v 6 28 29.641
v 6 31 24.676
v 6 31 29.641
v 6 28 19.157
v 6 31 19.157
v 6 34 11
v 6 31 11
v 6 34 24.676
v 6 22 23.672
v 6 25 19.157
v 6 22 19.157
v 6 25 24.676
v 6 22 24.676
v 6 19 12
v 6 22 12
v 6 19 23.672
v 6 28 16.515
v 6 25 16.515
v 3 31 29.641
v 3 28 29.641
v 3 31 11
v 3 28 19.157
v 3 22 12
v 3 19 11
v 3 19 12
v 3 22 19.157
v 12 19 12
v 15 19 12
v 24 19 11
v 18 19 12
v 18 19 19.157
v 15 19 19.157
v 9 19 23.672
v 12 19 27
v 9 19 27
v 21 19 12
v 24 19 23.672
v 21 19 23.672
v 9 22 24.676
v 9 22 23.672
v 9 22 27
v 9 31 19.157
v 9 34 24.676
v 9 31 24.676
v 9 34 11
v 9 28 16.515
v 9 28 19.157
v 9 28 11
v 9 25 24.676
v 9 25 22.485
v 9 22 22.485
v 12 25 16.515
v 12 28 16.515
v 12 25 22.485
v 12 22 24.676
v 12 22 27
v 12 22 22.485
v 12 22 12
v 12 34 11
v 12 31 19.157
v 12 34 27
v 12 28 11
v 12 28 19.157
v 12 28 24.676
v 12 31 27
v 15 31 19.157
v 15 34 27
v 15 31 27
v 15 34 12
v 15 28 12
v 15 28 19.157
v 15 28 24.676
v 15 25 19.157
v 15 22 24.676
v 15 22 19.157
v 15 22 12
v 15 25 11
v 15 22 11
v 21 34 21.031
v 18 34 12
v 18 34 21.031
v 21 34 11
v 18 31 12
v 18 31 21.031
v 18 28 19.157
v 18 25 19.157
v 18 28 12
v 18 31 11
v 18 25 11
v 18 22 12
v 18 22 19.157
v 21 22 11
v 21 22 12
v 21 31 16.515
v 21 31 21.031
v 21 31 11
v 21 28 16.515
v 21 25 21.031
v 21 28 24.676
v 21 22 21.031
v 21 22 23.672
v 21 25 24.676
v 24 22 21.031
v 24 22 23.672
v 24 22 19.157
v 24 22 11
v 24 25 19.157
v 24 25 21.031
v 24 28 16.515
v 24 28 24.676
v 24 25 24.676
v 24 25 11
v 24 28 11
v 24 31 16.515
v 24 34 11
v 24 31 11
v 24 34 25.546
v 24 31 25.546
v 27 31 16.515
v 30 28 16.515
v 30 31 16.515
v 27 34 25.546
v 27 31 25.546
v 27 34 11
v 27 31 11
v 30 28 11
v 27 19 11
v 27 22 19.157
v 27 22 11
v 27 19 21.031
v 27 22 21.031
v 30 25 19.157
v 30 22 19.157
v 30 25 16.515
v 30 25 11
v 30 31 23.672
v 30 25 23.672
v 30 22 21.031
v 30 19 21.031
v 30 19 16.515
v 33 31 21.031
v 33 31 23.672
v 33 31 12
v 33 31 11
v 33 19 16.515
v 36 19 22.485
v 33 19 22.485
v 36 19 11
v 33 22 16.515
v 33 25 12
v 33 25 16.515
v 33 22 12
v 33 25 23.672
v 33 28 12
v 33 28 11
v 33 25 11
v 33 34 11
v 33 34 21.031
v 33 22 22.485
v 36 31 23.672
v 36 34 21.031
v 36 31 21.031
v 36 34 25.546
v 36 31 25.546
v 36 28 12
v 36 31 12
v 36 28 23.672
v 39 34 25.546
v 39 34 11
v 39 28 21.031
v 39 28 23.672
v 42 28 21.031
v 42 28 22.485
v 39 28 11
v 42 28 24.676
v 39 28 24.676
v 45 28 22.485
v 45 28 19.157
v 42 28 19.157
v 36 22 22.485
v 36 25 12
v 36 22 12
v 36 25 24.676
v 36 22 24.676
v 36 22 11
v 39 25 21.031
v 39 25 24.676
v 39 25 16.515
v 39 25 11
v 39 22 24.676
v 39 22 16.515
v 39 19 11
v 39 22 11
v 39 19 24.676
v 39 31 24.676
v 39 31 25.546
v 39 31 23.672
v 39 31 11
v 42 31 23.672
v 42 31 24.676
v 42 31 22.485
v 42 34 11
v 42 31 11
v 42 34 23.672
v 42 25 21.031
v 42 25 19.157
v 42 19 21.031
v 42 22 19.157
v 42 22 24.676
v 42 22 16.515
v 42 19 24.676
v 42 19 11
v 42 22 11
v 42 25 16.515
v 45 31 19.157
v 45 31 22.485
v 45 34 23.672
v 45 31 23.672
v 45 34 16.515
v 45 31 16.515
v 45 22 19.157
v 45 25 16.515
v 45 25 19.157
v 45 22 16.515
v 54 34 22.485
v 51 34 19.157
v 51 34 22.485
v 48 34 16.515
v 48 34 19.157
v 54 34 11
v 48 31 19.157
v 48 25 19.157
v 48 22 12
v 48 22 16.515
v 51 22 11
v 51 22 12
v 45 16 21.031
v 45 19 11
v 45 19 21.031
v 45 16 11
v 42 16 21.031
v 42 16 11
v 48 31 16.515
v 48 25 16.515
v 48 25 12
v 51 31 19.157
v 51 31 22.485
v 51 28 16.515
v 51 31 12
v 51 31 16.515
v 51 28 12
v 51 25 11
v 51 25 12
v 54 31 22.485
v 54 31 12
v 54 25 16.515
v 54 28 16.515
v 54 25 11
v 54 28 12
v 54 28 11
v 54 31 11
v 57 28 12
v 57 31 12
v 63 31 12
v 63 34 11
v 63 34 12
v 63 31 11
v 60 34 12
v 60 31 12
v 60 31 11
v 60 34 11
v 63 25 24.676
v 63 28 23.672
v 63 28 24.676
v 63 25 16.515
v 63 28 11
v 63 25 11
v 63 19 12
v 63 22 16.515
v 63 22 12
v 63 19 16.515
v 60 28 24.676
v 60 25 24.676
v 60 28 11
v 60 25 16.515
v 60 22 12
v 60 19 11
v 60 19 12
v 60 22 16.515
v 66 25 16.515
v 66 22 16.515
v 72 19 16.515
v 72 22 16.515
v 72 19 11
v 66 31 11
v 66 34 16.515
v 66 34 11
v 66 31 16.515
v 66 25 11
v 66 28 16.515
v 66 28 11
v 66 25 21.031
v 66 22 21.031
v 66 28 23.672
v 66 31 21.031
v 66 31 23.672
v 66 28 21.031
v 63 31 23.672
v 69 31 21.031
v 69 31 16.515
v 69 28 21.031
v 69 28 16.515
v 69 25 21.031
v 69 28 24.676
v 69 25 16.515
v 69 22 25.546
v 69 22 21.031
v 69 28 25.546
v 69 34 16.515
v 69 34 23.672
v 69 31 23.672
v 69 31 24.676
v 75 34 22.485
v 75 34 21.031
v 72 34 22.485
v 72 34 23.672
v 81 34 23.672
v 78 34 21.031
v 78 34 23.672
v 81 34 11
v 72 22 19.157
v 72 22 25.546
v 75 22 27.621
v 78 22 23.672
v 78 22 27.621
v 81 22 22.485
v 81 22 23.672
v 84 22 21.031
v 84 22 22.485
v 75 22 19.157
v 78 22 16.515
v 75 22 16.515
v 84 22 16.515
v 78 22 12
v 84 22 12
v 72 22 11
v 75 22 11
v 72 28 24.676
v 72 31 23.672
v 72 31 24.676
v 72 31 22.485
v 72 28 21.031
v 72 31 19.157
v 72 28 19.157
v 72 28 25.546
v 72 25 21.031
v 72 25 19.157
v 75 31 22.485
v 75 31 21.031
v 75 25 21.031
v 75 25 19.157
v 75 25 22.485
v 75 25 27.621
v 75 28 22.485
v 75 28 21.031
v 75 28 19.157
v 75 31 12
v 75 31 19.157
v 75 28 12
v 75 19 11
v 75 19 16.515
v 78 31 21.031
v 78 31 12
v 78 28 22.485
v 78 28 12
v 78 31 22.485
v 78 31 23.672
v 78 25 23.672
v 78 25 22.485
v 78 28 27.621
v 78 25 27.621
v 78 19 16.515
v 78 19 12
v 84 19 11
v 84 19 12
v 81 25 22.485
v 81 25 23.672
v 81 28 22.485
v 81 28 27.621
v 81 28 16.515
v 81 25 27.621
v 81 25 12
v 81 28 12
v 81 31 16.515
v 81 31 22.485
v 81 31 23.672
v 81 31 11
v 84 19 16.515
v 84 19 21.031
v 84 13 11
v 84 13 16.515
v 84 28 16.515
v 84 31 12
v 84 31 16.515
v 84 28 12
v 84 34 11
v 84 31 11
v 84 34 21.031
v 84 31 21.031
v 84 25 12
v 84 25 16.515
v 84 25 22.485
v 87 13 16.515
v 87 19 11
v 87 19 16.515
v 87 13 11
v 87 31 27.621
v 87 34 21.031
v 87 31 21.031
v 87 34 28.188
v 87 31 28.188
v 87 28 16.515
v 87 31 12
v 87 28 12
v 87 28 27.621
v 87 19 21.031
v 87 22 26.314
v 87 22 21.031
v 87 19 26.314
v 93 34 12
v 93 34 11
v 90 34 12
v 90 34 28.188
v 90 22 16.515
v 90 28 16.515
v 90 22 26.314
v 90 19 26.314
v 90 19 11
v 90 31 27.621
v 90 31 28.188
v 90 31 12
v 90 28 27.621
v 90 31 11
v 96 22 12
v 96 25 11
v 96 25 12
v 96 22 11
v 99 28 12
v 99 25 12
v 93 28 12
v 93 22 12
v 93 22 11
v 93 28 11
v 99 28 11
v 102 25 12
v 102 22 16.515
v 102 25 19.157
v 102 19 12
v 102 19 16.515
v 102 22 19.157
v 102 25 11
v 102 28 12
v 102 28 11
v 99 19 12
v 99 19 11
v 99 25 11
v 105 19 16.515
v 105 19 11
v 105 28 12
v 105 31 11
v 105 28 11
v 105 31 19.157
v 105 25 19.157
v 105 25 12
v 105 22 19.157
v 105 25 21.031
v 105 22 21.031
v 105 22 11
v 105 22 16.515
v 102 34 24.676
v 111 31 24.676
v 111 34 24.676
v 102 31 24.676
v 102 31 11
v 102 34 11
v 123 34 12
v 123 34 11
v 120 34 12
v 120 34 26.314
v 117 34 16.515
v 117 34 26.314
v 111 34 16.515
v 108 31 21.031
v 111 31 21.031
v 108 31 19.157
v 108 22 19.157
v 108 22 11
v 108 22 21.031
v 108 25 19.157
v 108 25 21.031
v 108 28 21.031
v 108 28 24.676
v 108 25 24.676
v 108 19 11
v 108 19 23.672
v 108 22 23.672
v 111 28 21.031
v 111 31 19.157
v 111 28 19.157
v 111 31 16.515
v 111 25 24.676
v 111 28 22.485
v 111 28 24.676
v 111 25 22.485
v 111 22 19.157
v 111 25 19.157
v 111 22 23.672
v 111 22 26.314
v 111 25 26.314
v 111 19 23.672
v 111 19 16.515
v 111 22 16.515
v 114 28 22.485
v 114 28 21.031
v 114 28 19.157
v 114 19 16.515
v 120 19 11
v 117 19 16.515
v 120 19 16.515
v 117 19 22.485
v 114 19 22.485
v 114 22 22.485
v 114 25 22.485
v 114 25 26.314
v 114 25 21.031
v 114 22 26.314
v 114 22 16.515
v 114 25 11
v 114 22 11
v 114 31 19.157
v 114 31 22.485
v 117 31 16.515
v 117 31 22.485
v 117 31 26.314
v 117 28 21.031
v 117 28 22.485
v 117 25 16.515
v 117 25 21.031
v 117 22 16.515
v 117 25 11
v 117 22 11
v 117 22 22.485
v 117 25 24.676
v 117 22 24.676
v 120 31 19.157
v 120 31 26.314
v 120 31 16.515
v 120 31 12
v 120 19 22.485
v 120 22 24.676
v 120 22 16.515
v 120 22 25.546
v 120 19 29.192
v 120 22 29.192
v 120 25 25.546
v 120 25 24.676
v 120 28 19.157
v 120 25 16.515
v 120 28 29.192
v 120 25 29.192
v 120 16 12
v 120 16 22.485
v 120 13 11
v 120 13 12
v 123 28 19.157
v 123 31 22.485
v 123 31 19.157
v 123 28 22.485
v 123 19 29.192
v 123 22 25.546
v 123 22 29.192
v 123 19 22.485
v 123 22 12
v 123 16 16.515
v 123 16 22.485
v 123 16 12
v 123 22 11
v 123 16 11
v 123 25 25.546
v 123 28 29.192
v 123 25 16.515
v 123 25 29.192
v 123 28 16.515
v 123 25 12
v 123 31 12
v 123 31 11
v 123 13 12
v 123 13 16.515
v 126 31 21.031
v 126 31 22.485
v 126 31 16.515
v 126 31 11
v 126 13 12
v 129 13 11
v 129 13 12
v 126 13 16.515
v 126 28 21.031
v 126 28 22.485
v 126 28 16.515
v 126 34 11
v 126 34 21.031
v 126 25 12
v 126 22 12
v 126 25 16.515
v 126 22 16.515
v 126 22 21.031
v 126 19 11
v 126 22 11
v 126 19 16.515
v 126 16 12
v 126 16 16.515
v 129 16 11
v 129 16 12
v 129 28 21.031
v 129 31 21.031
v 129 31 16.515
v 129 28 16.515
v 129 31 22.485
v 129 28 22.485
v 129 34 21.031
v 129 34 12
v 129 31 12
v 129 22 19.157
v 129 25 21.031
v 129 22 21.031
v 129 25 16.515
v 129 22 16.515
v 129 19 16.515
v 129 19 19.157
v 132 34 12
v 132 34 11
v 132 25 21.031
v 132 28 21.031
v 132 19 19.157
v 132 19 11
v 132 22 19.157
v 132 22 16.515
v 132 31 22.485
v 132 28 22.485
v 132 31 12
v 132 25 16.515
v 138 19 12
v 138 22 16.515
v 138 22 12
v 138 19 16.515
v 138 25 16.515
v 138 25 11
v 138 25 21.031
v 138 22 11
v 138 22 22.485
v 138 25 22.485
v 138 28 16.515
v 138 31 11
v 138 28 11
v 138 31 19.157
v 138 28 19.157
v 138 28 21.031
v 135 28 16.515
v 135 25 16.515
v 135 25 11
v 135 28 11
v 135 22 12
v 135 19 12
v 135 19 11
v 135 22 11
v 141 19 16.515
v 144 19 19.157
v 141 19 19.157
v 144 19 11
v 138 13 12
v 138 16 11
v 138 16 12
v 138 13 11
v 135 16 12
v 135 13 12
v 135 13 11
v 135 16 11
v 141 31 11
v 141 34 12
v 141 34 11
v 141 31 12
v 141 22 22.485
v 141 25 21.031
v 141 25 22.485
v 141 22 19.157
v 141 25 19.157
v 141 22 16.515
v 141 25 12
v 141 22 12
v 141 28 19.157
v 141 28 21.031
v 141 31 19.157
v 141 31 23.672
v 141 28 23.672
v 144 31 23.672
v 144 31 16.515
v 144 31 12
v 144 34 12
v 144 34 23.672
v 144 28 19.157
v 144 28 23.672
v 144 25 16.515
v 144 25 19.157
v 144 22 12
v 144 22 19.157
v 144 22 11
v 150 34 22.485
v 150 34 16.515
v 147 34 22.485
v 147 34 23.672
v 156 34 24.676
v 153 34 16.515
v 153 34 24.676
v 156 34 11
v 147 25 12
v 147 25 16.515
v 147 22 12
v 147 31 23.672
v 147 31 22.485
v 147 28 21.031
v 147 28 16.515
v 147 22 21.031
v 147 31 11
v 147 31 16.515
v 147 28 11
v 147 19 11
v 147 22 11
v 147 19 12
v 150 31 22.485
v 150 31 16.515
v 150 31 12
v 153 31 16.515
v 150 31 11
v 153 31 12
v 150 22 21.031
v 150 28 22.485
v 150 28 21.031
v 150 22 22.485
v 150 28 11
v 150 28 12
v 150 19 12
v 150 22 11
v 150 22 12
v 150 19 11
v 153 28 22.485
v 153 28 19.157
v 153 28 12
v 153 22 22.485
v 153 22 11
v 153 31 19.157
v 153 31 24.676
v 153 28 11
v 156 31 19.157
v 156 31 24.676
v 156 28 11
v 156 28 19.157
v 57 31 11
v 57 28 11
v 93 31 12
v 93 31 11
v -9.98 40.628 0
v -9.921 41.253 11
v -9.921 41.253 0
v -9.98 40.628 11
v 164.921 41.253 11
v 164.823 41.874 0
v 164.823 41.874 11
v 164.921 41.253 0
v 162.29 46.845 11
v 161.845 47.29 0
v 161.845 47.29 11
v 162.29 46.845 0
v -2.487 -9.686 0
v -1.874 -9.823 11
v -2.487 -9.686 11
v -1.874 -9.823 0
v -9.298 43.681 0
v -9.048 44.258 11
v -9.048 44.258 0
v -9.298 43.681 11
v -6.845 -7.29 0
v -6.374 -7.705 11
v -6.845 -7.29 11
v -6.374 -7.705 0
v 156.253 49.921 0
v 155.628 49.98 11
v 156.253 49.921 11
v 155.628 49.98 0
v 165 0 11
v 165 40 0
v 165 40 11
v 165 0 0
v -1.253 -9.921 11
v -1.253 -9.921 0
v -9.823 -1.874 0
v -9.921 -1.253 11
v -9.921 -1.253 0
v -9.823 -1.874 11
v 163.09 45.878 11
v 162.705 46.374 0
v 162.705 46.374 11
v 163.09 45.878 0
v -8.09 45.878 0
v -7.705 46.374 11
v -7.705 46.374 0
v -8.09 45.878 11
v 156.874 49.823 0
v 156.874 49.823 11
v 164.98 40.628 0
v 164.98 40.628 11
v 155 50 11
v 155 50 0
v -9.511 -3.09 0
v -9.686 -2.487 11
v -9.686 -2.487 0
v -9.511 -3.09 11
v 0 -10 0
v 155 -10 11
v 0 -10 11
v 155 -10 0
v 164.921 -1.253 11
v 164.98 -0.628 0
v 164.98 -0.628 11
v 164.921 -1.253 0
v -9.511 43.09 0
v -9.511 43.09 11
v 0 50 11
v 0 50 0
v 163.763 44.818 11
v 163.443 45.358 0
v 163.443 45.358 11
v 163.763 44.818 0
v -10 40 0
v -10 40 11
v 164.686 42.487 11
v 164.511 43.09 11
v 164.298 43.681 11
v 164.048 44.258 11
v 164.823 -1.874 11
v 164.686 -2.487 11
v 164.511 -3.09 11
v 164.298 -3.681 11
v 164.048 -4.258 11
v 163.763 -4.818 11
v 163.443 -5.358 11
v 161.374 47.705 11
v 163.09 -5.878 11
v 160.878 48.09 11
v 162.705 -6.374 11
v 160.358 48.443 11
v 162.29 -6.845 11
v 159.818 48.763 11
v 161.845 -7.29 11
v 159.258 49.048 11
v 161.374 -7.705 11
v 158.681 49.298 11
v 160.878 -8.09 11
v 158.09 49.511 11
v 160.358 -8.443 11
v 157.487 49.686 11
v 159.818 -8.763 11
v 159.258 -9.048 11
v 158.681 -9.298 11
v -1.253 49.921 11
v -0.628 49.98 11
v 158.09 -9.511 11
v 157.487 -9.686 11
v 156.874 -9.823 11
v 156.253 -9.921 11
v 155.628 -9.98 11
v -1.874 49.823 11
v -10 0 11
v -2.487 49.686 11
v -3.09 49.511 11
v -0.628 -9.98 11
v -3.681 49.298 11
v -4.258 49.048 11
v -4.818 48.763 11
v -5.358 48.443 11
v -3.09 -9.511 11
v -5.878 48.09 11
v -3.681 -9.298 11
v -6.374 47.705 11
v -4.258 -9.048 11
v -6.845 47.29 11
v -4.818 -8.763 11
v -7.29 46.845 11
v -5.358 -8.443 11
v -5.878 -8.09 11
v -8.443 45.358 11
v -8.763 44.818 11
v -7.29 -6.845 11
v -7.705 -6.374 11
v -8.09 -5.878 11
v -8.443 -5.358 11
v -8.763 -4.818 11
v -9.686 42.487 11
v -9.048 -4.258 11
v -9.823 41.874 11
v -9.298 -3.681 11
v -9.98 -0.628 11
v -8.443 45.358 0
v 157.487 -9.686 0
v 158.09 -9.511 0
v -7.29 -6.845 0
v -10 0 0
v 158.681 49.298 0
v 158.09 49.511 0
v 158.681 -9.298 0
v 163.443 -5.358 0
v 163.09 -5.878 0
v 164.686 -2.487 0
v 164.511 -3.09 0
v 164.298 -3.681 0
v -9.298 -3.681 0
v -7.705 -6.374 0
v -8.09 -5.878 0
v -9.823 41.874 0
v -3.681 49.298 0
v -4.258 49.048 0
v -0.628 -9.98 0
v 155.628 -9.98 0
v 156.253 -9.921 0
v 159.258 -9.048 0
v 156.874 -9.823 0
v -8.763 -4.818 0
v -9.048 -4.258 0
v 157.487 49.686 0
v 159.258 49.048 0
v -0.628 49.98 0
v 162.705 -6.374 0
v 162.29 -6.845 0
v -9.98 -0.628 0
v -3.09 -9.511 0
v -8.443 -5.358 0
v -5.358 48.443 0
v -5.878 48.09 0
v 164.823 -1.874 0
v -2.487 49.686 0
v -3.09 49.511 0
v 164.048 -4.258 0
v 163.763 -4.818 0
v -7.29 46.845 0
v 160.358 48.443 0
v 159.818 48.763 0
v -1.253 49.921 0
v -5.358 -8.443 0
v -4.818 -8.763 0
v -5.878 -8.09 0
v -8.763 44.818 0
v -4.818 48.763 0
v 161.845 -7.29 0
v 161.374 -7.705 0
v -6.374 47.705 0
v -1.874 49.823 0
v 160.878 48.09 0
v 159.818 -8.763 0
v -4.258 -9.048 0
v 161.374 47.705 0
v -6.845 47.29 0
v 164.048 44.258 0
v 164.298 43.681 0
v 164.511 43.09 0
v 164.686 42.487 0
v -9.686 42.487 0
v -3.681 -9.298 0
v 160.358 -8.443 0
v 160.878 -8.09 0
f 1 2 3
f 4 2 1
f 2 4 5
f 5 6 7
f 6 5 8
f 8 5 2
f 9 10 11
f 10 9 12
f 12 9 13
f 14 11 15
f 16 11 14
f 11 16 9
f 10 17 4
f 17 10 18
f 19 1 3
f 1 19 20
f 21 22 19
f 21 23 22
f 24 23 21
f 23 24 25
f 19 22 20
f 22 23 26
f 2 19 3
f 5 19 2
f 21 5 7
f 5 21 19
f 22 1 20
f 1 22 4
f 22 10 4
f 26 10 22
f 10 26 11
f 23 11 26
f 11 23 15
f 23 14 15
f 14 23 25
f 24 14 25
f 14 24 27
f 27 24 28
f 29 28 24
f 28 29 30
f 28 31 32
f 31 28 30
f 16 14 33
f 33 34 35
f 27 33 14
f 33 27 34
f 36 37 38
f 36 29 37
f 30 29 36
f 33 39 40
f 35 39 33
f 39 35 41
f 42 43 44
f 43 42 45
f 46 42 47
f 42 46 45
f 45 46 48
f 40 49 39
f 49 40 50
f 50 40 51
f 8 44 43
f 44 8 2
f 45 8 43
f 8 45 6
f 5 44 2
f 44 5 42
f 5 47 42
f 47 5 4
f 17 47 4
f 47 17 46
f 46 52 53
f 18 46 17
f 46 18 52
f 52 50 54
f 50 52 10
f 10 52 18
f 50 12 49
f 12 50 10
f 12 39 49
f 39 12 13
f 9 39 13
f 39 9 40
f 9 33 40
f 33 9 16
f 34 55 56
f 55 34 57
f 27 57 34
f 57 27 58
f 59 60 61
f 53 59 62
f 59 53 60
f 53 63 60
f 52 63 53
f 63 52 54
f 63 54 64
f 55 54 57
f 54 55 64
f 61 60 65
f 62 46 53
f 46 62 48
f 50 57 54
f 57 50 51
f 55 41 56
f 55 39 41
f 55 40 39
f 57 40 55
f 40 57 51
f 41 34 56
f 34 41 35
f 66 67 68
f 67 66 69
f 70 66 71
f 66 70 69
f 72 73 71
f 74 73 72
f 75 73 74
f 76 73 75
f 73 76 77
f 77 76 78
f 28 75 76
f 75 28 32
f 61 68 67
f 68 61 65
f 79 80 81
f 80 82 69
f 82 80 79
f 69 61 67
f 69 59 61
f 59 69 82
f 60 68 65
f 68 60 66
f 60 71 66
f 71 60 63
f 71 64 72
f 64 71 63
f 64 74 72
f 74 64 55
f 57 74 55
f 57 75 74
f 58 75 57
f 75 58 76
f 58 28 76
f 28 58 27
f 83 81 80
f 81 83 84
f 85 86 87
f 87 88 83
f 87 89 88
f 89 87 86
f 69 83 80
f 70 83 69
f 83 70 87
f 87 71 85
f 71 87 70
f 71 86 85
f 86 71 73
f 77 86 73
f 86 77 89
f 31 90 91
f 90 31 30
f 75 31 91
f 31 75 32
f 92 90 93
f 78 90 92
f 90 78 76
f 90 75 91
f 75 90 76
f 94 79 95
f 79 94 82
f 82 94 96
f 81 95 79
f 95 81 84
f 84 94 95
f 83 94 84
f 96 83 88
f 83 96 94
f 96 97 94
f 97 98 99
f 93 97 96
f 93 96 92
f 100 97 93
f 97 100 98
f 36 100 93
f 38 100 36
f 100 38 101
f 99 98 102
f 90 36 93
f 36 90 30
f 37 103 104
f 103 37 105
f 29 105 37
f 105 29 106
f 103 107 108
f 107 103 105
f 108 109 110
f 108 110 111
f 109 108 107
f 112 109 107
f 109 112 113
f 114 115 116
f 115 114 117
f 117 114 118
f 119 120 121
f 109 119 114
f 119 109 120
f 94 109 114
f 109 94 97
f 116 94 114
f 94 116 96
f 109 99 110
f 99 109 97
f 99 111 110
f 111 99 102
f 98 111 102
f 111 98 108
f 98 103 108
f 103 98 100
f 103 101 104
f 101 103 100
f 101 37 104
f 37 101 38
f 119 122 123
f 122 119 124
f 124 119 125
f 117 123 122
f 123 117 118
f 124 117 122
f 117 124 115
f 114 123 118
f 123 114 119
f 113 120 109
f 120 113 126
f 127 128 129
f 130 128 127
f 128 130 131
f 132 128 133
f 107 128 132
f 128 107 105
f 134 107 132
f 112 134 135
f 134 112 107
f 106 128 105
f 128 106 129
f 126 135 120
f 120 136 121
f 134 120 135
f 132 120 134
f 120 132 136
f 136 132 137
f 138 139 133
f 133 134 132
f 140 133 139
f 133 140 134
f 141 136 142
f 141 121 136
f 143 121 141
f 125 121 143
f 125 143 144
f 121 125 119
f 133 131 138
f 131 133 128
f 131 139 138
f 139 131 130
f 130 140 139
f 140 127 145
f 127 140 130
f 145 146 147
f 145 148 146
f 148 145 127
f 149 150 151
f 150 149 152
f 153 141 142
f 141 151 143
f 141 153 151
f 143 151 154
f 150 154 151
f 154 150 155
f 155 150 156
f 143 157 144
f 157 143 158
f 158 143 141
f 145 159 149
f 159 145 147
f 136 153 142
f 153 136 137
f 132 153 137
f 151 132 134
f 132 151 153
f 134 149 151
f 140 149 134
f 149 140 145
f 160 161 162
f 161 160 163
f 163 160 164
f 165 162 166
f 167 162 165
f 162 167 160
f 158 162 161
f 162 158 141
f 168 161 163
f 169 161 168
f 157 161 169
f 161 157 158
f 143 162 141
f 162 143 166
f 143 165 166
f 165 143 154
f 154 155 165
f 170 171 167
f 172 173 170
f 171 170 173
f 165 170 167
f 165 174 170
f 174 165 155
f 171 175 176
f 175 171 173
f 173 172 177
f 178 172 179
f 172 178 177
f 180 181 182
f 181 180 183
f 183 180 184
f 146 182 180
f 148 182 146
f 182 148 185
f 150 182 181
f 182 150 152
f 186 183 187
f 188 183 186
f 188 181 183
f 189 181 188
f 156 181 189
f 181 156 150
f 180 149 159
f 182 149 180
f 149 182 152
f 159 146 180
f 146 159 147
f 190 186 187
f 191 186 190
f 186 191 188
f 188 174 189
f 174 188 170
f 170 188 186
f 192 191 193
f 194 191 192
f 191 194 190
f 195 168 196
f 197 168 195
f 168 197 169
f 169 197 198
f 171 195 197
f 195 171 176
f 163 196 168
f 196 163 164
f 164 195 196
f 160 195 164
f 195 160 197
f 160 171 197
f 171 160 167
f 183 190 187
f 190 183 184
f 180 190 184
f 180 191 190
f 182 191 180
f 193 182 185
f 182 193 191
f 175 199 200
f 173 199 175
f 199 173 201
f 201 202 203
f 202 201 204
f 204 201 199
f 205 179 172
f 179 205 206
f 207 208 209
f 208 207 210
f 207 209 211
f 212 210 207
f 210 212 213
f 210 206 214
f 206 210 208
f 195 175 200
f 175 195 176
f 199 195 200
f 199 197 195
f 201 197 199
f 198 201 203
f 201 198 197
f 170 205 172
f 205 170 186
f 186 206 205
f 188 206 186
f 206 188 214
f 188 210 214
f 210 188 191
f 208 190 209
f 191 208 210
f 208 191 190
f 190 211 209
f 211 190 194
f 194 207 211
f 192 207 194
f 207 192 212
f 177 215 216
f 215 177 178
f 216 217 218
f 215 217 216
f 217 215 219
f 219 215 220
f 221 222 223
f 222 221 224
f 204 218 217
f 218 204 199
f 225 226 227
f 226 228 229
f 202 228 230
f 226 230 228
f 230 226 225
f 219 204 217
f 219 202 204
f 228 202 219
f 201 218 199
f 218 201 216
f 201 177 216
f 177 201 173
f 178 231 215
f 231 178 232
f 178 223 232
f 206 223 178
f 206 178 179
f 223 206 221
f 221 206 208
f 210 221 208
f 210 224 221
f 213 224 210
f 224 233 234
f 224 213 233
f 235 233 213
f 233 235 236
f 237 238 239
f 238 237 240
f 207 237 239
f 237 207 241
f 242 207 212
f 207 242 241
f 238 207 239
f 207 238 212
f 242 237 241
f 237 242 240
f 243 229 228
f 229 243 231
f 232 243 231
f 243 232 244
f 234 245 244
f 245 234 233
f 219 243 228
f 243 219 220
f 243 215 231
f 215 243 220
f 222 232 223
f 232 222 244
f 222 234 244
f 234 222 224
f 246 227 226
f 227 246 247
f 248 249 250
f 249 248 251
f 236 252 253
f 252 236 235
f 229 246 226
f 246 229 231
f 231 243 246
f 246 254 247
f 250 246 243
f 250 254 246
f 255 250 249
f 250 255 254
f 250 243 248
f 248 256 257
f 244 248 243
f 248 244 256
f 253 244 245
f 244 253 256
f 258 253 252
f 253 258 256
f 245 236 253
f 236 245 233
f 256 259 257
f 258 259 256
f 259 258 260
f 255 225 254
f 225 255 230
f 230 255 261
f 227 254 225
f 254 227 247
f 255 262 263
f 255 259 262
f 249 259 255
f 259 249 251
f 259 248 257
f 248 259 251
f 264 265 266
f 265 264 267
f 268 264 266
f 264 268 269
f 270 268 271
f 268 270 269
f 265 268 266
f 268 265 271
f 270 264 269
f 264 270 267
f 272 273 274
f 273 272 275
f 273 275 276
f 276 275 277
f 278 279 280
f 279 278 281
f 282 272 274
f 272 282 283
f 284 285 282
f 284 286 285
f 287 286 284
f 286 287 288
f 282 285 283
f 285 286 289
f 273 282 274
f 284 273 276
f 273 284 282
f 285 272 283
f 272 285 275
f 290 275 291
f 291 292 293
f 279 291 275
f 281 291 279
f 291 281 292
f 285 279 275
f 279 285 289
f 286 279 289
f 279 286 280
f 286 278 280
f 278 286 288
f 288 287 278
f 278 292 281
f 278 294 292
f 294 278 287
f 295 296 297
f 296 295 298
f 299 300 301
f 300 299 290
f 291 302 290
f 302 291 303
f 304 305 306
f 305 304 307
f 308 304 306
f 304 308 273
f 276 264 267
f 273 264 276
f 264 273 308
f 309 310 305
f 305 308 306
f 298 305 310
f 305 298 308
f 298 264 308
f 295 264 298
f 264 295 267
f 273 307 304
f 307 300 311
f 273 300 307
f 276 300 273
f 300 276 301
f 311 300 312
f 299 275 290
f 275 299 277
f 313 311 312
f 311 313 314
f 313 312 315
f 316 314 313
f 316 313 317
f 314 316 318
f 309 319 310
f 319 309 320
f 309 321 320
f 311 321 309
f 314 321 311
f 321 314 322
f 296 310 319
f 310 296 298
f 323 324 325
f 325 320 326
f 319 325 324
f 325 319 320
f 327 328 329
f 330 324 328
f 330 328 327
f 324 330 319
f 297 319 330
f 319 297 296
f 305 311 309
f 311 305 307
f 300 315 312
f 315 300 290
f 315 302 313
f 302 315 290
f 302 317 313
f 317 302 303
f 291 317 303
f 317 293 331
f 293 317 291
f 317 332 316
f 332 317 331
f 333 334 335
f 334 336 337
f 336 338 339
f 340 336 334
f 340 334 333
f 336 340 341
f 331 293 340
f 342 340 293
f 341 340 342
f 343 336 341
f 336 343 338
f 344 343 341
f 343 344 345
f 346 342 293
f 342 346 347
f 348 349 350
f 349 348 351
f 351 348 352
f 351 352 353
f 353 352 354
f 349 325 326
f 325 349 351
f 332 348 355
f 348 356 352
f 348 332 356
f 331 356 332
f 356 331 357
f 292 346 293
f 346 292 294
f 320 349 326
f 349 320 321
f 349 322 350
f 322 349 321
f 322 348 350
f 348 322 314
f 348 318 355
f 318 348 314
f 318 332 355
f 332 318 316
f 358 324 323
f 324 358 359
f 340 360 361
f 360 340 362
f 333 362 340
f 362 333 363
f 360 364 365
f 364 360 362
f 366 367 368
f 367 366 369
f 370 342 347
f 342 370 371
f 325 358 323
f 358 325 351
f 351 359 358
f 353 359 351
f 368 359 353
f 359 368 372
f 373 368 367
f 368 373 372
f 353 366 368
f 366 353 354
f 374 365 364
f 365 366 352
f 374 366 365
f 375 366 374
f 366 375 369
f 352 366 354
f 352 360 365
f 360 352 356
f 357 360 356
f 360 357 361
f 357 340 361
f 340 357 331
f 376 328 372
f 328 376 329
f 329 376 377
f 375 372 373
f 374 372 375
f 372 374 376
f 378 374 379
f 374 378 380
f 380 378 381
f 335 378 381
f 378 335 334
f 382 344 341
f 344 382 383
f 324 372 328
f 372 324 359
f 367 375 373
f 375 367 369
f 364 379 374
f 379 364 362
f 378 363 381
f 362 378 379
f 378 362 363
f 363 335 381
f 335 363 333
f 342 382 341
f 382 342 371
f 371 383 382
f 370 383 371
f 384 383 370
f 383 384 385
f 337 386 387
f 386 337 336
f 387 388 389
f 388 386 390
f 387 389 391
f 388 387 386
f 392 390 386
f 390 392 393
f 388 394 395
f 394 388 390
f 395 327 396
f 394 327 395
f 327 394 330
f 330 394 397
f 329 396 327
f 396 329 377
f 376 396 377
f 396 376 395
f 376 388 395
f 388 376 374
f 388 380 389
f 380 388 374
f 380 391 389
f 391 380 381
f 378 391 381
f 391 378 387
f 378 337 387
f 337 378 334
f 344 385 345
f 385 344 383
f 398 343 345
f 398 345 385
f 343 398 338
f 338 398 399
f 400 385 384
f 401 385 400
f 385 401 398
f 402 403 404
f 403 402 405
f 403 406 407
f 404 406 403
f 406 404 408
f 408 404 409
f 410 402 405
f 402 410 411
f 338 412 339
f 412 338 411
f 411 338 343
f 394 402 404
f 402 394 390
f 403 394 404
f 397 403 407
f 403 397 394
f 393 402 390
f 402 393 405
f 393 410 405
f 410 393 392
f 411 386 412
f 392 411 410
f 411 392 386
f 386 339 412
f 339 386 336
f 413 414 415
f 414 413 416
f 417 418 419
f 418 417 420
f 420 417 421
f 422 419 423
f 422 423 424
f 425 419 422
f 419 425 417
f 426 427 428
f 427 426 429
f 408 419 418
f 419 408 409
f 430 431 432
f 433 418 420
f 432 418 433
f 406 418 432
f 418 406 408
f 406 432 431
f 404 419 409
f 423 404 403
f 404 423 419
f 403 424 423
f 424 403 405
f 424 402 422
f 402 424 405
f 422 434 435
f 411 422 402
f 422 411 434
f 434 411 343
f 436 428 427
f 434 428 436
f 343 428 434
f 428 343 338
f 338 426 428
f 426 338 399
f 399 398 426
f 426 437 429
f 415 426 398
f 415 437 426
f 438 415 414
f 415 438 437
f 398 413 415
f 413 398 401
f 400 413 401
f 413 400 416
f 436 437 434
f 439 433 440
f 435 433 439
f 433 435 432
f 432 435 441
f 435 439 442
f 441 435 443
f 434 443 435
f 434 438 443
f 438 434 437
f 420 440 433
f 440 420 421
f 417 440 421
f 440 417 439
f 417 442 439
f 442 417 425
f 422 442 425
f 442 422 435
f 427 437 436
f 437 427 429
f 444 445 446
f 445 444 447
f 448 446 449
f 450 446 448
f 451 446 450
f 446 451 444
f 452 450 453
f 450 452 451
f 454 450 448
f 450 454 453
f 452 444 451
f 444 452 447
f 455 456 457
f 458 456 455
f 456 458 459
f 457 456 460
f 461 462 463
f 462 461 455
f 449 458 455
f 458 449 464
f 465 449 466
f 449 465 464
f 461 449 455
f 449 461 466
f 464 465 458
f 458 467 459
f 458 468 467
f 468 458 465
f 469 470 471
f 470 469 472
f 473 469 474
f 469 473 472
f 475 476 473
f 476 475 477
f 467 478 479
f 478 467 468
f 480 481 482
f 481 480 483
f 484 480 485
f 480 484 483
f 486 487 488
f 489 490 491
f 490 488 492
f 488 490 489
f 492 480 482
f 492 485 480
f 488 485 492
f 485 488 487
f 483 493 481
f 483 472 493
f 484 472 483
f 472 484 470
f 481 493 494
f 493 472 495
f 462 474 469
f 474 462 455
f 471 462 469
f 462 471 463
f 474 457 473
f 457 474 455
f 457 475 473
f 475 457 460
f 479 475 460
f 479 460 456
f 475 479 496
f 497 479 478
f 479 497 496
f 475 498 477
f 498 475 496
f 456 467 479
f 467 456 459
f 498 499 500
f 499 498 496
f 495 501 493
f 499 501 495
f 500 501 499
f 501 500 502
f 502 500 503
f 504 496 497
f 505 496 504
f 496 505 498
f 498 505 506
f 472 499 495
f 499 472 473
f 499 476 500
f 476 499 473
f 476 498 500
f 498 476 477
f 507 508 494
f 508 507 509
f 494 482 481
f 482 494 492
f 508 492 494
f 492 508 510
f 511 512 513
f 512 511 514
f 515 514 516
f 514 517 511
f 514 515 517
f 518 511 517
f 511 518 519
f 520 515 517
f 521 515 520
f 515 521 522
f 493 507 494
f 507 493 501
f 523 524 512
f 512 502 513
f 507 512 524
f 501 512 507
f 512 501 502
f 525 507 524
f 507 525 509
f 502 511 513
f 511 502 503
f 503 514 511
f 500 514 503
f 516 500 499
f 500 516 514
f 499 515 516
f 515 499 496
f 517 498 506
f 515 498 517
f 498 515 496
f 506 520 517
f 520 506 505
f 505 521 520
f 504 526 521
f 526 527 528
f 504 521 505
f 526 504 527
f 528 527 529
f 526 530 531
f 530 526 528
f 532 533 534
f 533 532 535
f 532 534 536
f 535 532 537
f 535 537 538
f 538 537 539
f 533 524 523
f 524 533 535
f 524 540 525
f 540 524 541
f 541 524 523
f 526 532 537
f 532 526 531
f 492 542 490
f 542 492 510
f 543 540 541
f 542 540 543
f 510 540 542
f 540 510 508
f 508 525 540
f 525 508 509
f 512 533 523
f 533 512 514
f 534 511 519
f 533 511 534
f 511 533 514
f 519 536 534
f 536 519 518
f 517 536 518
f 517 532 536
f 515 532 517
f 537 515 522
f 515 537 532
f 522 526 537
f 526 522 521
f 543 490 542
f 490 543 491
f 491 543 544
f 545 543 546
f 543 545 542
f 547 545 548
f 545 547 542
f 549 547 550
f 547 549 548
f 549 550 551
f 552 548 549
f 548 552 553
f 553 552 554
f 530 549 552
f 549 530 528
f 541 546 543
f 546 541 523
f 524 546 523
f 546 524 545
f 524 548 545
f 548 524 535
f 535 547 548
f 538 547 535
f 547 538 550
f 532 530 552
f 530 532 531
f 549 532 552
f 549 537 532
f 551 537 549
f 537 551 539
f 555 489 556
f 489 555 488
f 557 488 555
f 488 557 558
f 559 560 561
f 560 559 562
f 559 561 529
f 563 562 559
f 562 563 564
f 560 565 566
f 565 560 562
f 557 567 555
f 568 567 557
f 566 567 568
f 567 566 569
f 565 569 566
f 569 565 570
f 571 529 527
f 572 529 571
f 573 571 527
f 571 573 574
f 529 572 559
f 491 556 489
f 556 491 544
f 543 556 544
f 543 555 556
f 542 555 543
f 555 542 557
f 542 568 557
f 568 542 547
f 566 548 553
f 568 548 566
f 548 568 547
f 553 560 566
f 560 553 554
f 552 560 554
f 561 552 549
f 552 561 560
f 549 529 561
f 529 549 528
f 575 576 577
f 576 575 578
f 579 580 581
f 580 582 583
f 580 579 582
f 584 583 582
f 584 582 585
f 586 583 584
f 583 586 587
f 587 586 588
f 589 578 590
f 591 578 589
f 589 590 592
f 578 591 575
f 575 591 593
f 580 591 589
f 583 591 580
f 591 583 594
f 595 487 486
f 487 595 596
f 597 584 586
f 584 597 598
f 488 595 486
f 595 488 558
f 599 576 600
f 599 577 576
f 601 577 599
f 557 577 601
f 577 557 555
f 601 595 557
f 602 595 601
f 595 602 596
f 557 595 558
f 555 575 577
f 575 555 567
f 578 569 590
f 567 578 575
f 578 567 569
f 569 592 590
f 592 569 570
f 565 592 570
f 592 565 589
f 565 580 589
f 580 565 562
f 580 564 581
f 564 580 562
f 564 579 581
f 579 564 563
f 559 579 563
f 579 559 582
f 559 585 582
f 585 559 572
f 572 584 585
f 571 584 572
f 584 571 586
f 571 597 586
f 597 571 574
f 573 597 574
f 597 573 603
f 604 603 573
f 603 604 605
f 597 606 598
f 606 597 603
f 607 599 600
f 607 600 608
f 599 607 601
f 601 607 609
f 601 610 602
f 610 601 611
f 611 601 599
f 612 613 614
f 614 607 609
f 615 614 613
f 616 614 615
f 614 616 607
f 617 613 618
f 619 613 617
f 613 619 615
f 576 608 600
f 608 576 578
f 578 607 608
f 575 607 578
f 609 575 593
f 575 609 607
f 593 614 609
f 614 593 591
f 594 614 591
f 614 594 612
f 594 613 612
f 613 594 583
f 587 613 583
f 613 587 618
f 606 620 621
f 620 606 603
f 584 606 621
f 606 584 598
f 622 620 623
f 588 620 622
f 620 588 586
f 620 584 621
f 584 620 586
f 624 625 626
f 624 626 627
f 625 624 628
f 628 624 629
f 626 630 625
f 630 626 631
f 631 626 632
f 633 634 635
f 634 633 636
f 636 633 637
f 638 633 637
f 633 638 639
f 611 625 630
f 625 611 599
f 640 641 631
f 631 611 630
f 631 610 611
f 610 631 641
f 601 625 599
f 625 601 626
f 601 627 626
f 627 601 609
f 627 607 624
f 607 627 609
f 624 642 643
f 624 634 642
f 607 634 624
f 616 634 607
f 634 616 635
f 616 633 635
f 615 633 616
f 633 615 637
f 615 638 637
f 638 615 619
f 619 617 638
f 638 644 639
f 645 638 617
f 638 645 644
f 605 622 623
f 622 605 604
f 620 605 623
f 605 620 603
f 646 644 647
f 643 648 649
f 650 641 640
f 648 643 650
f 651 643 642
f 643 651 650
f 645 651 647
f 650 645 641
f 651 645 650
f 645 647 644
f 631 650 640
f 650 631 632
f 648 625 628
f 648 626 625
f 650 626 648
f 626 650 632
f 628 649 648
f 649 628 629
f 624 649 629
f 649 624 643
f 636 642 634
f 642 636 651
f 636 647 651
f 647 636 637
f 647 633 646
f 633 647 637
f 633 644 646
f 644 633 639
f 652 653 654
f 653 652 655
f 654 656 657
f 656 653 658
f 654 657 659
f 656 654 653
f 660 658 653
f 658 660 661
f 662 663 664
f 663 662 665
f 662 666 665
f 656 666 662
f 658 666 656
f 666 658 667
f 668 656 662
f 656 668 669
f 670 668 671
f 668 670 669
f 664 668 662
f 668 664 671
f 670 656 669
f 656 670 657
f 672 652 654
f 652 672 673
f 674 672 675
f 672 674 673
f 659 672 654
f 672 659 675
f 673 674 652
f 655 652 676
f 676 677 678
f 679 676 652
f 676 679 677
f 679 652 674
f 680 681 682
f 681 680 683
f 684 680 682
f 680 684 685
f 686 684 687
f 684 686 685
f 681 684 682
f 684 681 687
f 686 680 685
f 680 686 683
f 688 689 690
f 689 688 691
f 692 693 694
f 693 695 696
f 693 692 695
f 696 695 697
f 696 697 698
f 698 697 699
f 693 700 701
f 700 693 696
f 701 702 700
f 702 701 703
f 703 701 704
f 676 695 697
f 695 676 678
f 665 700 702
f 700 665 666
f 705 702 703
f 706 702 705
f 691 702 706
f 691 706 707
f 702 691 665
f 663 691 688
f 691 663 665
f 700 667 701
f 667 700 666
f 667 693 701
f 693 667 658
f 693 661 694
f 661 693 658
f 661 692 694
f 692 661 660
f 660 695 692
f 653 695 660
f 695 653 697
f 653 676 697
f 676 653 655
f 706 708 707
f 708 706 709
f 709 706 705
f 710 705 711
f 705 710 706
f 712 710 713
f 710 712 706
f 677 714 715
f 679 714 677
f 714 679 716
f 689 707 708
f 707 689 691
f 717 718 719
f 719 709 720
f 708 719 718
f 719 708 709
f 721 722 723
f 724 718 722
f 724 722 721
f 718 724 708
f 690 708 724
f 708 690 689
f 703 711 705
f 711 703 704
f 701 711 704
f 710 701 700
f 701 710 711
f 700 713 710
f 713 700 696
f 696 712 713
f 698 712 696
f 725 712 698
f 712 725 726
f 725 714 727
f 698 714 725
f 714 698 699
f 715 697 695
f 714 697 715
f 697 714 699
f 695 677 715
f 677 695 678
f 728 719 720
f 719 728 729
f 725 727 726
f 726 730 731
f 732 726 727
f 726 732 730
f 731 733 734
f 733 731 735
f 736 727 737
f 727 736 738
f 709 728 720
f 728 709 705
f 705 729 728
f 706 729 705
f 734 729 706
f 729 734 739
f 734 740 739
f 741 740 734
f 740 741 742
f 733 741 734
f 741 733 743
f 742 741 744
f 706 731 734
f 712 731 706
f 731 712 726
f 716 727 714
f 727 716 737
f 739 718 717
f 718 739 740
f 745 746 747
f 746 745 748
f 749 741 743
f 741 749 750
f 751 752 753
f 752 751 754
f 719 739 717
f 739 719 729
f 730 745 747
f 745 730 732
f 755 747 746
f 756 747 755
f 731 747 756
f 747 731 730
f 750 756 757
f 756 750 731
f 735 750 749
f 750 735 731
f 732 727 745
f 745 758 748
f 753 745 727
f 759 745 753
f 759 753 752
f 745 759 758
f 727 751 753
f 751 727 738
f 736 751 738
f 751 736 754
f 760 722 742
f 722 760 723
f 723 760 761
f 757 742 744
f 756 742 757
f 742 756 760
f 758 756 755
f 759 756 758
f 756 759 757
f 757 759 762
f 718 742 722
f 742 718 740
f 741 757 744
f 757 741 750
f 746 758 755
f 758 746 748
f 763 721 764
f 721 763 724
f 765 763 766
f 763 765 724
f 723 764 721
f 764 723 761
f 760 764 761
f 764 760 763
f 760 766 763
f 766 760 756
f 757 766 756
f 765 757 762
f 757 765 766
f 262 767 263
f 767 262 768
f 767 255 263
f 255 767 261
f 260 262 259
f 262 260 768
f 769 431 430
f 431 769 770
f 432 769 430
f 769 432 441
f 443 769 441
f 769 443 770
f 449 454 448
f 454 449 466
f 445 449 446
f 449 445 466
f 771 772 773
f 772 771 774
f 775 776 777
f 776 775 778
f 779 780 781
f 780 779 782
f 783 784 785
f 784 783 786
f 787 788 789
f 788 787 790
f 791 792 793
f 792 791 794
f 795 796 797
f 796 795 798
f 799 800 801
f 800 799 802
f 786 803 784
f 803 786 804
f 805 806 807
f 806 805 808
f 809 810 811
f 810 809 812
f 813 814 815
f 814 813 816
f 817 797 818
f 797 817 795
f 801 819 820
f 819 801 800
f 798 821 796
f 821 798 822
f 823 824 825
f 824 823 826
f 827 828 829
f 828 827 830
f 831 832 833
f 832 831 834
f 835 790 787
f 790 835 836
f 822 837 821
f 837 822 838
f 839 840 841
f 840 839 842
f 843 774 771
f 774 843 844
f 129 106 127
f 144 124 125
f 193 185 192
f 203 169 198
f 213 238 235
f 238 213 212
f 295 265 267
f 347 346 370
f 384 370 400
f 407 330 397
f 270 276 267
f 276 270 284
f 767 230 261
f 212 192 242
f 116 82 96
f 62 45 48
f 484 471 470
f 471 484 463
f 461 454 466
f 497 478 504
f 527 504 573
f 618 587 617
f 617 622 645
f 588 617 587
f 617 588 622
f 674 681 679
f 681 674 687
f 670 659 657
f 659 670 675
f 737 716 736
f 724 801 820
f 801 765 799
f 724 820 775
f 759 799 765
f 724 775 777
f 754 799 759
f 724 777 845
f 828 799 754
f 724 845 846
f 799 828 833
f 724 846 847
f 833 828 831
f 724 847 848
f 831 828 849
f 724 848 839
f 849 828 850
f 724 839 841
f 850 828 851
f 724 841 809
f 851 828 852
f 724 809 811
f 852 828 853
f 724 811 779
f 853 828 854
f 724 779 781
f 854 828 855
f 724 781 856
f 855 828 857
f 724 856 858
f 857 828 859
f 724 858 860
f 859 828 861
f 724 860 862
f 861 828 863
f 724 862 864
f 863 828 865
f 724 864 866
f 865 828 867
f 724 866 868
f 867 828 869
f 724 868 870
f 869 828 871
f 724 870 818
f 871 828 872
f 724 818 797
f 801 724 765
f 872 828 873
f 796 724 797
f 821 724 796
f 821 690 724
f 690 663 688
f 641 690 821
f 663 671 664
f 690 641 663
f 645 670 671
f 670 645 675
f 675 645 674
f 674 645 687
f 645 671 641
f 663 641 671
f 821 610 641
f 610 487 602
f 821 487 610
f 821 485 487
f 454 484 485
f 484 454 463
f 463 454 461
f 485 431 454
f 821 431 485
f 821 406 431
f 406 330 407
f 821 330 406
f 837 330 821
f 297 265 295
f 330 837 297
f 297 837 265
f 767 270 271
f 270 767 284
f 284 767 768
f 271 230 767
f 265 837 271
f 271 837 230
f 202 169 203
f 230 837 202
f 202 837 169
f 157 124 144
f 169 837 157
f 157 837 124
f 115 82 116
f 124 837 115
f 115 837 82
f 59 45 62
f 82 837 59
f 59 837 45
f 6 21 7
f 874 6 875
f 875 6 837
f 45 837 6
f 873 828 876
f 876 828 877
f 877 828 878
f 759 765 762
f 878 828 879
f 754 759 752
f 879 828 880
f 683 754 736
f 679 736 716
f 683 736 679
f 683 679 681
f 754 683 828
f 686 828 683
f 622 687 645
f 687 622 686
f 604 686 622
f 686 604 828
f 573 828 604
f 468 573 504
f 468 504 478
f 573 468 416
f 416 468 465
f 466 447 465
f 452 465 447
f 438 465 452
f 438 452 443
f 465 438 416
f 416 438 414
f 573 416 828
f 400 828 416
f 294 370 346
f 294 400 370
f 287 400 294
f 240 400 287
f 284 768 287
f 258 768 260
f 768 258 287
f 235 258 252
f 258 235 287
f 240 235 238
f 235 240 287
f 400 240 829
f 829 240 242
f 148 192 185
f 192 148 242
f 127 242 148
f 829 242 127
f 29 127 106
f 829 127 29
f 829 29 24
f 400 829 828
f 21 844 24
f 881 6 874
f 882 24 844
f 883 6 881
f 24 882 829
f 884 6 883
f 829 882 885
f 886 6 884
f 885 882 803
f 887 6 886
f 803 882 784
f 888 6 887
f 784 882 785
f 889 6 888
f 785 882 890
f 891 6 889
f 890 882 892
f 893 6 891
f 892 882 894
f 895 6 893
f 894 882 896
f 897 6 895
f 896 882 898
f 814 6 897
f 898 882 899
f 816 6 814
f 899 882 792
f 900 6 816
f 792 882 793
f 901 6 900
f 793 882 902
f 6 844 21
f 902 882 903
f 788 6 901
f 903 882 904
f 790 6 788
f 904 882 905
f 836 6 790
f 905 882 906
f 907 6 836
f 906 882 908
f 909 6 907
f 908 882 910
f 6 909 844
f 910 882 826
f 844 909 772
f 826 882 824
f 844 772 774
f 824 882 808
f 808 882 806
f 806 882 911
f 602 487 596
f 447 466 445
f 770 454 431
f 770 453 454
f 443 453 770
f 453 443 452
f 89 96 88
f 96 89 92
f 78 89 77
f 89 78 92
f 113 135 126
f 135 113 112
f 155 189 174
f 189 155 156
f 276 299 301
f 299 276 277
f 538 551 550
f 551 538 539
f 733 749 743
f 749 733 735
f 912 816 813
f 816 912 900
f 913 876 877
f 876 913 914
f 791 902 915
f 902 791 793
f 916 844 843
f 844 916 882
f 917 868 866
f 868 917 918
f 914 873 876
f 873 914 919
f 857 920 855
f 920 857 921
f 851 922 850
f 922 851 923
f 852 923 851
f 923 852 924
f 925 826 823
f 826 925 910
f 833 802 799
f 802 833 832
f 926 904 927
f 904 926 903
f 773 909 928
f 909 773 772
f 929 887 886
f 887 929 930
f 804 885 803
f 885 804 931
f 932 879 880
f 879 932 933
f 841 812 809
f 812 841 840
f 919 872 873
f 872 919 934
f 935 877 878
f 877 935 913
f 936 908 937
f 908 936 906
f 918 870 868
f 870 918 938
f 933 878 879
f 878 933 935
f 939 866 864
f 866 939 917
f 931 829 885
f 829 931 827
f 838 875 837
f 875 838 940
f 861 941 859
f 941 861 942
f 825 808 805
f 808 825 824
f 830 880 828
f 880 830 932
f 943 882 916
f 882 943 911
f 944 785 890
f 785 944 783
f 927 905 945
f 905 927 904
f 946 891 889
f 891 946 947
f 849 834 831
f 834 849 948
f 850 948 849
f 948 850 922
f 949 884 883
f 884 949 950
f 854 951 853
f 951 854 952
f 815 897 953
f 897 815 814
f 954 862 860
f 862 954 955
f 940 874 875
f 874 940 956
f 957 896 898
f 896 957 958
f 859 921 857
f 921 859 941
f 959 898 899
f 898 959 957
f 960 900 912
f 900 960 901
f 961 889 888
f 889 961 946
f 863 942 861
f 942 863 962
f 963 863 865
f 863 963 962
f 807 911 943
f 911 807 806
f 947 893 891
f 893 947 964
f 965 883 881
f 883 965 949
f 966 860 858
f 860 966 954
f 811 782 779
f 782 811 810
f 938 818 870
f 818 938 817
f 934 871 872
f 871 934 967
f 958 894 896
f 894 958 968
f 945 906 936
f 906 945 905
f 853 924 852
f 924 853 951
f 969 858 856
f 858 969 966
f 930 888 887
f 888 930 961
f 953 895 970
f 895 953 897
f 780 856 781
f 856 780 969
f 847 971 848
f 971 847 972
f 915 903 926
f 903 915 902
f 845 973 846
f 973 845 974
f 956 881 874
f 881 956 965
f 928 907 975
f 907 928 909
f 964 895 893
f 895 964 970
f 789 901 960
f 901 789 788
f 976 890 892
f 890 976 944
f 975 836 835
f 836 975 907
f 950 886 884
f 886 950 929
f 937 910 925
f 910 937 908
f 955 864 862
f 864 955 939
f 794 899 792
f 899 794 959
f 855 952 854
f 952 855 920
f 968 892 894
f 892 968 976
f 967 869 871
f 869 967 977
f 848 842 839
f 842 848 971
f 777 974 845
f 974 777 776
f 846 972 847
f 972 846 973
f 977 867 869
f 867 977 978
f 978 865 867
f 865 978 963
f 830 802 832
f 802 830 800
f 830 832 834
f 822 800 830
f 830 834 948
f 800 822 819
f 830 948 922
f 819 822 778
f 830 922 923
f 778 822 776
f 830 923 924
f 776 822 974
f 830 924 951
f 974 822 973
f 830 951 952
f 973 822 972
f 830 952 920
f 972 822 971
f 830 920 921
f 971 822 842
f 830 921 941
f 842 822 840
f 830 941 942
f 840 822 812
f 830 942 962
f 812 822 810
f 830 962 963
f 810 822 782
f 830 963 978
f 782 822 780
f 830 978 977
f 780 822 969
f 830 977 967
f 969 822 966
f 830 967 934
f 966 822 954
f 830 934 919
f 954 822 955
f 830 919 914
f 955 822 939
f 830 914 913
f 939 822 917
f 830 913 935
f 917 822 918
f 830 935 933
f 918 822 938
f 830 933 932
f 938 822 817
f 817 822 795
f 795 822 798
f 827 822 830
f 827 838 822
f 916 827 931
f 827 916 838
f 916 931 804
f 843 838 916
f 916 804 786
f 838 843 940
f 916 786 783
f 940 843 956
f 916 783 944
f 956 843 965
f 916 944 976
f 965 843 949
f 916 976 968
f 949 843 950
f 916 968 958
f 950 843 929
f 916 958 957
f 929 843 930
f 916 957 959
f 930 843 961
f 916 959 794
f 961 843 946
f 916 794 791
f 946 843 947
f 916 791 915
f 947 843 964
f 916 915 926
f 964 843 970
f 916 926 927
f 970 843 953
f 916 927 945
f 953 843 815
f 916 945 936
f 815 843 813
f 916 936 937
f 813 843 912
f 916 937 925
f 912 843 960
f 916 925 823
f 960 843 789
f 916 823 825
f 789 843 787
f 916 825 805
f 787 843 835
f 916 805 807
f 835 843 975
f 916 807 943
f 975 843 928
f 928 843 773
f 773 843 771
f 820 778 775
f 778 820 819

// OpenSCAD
// file: activity-data.scad
// To be used in other OpenScad source file with
// include <rawActivity.scad>
rawActivity = [
    [0, 0, 0, 0, 0, 0, 0],
    [0, 15, 3, 3, 1, 0, 0],
    [7, 3, 2, 7, 6, 0, 0],
    [0, 0, 2, 5, 10, 0, 0],
    [10, 3, 7, 7, 1, 0, 0],
    [1, 1, 3, 0, 3, 0, 0],
    [4, 0, 0, 0, 1, 0, 0],
    [0, 2, 7, 4, 6, 0, 0],
    [8, 2, 0, 3, 0, 0, 0],
    [0, 2, 0, 3, 4, 0, 0],
    [0, 6, 6, 2, 2, 0, 0],
    [4, 1, 0, 1, 5, 0, 0],
    [8, 6, 0, 7, 0, 0, 0],
    [0, 7, 4, 2, 7, 0, 0],
    [6, 5, 3, 3, 0, 4, 0],
    [2, 3, 3, 2, 0, 0, 0],
    [3, 2, 2, 1, 0, 0, 0],
    [5, 1, 2, 0, 0, 0, 0],
    [0, 1, 0, 0, 0, 0, 0],
    [0, 0, 0, 0, 0, 0, 0],
    [1, 0, 7, 2, 1, 0, 0],
    [0, 6, 0, 2, 2, 0, 0],
    [2, 4, 2, 4, 2, 0, 0],
    [6, 7, 8, 8, 2, 0, 0],
    [5, 3, 4, 3, 0, 0, 0],
    [4, 1, 5, 11, 2, 0, 0],
    [6, 5, 11, 6, 1, 0, 0],
    [0, 2, 1, 5, 1, 0, 0],
    [4, 1, 2, 2, 4, 2, 2],
    [12, 11, 2, 2, 9, 0, 0],
    [1, 0, 0, 0, 0, 0, 0],
    [0, 0, 1, 1, 0, 0, 0],
    [0, 0, 1, 0, 0, 0, 0],
    [0, 0, 0, 1, 1, 0, 0],
    [7, 0, 1, 3, 2, 0, 0],
    [7, 3, 3, 4, 0, 0, 0],
    [7, 4, 7, 3, 6, 0, 0],
    [2, 3, 5, 9, 2, 0, 0],
    [2, 5, 4, 0, 5, 0, 0],
    [9, 2, 2, 7, 2, 0, 0],
    [1, 3, 14, 8, 14, 5, 1],
    [0, 5, 2, 1, 0, 0, 2],
    [4, 2, 4, 4, 2, 0, 1],
    [1, 5, 4, 2, 3, 0, 0],
    [0, 0, 0, 0, 0, 0, 0],
    [0, 0, 2, 0, 1, 0, 1],
    [0, 3, 4, 5, 2, 0, 0],
    [1, 6, 3, 1, 3, 0, 0],
    [6, 2, 2, 1, 0, 0, 0],
    [5, 0, 4, 4, 1, 0, 0],
    [2, 1, 5, 5, 0, 0, 0],
    [7, 3, 0, 0, 0, 0, 0],
];
// main file
include <activity-data.scad>

$fn = 100;

baseH = 10;
baseL = 155;
baseW = 40;

activityBase = 2; 
activityL = 3;
activityHfactor = activityL*5;
activityPadding = 10;

module base() {
    minkowski() {
        cube([baseL, baseW, baseH]);
        cylinder(h = 1, r = baseH);
    }
}

module activity() {
    for (j = [0:len(rawActivity)-1]) {
        week = rawActivity[j];
        for (i = [0:len(week)-1]) {
            h = activityBase + log(week[i])*activityHfactor;
            translate([j*activityL, (len(week)-i)*activityL, baseH]) {
                cube([activityL, activityL, h]);
            }
        }
    }
}

module userHandle() {
}

module year() {
}

union() {
    base();
    translate([0, activityPadding, 0]) {
        activity();
    }
    userHandle();
    year();
}
